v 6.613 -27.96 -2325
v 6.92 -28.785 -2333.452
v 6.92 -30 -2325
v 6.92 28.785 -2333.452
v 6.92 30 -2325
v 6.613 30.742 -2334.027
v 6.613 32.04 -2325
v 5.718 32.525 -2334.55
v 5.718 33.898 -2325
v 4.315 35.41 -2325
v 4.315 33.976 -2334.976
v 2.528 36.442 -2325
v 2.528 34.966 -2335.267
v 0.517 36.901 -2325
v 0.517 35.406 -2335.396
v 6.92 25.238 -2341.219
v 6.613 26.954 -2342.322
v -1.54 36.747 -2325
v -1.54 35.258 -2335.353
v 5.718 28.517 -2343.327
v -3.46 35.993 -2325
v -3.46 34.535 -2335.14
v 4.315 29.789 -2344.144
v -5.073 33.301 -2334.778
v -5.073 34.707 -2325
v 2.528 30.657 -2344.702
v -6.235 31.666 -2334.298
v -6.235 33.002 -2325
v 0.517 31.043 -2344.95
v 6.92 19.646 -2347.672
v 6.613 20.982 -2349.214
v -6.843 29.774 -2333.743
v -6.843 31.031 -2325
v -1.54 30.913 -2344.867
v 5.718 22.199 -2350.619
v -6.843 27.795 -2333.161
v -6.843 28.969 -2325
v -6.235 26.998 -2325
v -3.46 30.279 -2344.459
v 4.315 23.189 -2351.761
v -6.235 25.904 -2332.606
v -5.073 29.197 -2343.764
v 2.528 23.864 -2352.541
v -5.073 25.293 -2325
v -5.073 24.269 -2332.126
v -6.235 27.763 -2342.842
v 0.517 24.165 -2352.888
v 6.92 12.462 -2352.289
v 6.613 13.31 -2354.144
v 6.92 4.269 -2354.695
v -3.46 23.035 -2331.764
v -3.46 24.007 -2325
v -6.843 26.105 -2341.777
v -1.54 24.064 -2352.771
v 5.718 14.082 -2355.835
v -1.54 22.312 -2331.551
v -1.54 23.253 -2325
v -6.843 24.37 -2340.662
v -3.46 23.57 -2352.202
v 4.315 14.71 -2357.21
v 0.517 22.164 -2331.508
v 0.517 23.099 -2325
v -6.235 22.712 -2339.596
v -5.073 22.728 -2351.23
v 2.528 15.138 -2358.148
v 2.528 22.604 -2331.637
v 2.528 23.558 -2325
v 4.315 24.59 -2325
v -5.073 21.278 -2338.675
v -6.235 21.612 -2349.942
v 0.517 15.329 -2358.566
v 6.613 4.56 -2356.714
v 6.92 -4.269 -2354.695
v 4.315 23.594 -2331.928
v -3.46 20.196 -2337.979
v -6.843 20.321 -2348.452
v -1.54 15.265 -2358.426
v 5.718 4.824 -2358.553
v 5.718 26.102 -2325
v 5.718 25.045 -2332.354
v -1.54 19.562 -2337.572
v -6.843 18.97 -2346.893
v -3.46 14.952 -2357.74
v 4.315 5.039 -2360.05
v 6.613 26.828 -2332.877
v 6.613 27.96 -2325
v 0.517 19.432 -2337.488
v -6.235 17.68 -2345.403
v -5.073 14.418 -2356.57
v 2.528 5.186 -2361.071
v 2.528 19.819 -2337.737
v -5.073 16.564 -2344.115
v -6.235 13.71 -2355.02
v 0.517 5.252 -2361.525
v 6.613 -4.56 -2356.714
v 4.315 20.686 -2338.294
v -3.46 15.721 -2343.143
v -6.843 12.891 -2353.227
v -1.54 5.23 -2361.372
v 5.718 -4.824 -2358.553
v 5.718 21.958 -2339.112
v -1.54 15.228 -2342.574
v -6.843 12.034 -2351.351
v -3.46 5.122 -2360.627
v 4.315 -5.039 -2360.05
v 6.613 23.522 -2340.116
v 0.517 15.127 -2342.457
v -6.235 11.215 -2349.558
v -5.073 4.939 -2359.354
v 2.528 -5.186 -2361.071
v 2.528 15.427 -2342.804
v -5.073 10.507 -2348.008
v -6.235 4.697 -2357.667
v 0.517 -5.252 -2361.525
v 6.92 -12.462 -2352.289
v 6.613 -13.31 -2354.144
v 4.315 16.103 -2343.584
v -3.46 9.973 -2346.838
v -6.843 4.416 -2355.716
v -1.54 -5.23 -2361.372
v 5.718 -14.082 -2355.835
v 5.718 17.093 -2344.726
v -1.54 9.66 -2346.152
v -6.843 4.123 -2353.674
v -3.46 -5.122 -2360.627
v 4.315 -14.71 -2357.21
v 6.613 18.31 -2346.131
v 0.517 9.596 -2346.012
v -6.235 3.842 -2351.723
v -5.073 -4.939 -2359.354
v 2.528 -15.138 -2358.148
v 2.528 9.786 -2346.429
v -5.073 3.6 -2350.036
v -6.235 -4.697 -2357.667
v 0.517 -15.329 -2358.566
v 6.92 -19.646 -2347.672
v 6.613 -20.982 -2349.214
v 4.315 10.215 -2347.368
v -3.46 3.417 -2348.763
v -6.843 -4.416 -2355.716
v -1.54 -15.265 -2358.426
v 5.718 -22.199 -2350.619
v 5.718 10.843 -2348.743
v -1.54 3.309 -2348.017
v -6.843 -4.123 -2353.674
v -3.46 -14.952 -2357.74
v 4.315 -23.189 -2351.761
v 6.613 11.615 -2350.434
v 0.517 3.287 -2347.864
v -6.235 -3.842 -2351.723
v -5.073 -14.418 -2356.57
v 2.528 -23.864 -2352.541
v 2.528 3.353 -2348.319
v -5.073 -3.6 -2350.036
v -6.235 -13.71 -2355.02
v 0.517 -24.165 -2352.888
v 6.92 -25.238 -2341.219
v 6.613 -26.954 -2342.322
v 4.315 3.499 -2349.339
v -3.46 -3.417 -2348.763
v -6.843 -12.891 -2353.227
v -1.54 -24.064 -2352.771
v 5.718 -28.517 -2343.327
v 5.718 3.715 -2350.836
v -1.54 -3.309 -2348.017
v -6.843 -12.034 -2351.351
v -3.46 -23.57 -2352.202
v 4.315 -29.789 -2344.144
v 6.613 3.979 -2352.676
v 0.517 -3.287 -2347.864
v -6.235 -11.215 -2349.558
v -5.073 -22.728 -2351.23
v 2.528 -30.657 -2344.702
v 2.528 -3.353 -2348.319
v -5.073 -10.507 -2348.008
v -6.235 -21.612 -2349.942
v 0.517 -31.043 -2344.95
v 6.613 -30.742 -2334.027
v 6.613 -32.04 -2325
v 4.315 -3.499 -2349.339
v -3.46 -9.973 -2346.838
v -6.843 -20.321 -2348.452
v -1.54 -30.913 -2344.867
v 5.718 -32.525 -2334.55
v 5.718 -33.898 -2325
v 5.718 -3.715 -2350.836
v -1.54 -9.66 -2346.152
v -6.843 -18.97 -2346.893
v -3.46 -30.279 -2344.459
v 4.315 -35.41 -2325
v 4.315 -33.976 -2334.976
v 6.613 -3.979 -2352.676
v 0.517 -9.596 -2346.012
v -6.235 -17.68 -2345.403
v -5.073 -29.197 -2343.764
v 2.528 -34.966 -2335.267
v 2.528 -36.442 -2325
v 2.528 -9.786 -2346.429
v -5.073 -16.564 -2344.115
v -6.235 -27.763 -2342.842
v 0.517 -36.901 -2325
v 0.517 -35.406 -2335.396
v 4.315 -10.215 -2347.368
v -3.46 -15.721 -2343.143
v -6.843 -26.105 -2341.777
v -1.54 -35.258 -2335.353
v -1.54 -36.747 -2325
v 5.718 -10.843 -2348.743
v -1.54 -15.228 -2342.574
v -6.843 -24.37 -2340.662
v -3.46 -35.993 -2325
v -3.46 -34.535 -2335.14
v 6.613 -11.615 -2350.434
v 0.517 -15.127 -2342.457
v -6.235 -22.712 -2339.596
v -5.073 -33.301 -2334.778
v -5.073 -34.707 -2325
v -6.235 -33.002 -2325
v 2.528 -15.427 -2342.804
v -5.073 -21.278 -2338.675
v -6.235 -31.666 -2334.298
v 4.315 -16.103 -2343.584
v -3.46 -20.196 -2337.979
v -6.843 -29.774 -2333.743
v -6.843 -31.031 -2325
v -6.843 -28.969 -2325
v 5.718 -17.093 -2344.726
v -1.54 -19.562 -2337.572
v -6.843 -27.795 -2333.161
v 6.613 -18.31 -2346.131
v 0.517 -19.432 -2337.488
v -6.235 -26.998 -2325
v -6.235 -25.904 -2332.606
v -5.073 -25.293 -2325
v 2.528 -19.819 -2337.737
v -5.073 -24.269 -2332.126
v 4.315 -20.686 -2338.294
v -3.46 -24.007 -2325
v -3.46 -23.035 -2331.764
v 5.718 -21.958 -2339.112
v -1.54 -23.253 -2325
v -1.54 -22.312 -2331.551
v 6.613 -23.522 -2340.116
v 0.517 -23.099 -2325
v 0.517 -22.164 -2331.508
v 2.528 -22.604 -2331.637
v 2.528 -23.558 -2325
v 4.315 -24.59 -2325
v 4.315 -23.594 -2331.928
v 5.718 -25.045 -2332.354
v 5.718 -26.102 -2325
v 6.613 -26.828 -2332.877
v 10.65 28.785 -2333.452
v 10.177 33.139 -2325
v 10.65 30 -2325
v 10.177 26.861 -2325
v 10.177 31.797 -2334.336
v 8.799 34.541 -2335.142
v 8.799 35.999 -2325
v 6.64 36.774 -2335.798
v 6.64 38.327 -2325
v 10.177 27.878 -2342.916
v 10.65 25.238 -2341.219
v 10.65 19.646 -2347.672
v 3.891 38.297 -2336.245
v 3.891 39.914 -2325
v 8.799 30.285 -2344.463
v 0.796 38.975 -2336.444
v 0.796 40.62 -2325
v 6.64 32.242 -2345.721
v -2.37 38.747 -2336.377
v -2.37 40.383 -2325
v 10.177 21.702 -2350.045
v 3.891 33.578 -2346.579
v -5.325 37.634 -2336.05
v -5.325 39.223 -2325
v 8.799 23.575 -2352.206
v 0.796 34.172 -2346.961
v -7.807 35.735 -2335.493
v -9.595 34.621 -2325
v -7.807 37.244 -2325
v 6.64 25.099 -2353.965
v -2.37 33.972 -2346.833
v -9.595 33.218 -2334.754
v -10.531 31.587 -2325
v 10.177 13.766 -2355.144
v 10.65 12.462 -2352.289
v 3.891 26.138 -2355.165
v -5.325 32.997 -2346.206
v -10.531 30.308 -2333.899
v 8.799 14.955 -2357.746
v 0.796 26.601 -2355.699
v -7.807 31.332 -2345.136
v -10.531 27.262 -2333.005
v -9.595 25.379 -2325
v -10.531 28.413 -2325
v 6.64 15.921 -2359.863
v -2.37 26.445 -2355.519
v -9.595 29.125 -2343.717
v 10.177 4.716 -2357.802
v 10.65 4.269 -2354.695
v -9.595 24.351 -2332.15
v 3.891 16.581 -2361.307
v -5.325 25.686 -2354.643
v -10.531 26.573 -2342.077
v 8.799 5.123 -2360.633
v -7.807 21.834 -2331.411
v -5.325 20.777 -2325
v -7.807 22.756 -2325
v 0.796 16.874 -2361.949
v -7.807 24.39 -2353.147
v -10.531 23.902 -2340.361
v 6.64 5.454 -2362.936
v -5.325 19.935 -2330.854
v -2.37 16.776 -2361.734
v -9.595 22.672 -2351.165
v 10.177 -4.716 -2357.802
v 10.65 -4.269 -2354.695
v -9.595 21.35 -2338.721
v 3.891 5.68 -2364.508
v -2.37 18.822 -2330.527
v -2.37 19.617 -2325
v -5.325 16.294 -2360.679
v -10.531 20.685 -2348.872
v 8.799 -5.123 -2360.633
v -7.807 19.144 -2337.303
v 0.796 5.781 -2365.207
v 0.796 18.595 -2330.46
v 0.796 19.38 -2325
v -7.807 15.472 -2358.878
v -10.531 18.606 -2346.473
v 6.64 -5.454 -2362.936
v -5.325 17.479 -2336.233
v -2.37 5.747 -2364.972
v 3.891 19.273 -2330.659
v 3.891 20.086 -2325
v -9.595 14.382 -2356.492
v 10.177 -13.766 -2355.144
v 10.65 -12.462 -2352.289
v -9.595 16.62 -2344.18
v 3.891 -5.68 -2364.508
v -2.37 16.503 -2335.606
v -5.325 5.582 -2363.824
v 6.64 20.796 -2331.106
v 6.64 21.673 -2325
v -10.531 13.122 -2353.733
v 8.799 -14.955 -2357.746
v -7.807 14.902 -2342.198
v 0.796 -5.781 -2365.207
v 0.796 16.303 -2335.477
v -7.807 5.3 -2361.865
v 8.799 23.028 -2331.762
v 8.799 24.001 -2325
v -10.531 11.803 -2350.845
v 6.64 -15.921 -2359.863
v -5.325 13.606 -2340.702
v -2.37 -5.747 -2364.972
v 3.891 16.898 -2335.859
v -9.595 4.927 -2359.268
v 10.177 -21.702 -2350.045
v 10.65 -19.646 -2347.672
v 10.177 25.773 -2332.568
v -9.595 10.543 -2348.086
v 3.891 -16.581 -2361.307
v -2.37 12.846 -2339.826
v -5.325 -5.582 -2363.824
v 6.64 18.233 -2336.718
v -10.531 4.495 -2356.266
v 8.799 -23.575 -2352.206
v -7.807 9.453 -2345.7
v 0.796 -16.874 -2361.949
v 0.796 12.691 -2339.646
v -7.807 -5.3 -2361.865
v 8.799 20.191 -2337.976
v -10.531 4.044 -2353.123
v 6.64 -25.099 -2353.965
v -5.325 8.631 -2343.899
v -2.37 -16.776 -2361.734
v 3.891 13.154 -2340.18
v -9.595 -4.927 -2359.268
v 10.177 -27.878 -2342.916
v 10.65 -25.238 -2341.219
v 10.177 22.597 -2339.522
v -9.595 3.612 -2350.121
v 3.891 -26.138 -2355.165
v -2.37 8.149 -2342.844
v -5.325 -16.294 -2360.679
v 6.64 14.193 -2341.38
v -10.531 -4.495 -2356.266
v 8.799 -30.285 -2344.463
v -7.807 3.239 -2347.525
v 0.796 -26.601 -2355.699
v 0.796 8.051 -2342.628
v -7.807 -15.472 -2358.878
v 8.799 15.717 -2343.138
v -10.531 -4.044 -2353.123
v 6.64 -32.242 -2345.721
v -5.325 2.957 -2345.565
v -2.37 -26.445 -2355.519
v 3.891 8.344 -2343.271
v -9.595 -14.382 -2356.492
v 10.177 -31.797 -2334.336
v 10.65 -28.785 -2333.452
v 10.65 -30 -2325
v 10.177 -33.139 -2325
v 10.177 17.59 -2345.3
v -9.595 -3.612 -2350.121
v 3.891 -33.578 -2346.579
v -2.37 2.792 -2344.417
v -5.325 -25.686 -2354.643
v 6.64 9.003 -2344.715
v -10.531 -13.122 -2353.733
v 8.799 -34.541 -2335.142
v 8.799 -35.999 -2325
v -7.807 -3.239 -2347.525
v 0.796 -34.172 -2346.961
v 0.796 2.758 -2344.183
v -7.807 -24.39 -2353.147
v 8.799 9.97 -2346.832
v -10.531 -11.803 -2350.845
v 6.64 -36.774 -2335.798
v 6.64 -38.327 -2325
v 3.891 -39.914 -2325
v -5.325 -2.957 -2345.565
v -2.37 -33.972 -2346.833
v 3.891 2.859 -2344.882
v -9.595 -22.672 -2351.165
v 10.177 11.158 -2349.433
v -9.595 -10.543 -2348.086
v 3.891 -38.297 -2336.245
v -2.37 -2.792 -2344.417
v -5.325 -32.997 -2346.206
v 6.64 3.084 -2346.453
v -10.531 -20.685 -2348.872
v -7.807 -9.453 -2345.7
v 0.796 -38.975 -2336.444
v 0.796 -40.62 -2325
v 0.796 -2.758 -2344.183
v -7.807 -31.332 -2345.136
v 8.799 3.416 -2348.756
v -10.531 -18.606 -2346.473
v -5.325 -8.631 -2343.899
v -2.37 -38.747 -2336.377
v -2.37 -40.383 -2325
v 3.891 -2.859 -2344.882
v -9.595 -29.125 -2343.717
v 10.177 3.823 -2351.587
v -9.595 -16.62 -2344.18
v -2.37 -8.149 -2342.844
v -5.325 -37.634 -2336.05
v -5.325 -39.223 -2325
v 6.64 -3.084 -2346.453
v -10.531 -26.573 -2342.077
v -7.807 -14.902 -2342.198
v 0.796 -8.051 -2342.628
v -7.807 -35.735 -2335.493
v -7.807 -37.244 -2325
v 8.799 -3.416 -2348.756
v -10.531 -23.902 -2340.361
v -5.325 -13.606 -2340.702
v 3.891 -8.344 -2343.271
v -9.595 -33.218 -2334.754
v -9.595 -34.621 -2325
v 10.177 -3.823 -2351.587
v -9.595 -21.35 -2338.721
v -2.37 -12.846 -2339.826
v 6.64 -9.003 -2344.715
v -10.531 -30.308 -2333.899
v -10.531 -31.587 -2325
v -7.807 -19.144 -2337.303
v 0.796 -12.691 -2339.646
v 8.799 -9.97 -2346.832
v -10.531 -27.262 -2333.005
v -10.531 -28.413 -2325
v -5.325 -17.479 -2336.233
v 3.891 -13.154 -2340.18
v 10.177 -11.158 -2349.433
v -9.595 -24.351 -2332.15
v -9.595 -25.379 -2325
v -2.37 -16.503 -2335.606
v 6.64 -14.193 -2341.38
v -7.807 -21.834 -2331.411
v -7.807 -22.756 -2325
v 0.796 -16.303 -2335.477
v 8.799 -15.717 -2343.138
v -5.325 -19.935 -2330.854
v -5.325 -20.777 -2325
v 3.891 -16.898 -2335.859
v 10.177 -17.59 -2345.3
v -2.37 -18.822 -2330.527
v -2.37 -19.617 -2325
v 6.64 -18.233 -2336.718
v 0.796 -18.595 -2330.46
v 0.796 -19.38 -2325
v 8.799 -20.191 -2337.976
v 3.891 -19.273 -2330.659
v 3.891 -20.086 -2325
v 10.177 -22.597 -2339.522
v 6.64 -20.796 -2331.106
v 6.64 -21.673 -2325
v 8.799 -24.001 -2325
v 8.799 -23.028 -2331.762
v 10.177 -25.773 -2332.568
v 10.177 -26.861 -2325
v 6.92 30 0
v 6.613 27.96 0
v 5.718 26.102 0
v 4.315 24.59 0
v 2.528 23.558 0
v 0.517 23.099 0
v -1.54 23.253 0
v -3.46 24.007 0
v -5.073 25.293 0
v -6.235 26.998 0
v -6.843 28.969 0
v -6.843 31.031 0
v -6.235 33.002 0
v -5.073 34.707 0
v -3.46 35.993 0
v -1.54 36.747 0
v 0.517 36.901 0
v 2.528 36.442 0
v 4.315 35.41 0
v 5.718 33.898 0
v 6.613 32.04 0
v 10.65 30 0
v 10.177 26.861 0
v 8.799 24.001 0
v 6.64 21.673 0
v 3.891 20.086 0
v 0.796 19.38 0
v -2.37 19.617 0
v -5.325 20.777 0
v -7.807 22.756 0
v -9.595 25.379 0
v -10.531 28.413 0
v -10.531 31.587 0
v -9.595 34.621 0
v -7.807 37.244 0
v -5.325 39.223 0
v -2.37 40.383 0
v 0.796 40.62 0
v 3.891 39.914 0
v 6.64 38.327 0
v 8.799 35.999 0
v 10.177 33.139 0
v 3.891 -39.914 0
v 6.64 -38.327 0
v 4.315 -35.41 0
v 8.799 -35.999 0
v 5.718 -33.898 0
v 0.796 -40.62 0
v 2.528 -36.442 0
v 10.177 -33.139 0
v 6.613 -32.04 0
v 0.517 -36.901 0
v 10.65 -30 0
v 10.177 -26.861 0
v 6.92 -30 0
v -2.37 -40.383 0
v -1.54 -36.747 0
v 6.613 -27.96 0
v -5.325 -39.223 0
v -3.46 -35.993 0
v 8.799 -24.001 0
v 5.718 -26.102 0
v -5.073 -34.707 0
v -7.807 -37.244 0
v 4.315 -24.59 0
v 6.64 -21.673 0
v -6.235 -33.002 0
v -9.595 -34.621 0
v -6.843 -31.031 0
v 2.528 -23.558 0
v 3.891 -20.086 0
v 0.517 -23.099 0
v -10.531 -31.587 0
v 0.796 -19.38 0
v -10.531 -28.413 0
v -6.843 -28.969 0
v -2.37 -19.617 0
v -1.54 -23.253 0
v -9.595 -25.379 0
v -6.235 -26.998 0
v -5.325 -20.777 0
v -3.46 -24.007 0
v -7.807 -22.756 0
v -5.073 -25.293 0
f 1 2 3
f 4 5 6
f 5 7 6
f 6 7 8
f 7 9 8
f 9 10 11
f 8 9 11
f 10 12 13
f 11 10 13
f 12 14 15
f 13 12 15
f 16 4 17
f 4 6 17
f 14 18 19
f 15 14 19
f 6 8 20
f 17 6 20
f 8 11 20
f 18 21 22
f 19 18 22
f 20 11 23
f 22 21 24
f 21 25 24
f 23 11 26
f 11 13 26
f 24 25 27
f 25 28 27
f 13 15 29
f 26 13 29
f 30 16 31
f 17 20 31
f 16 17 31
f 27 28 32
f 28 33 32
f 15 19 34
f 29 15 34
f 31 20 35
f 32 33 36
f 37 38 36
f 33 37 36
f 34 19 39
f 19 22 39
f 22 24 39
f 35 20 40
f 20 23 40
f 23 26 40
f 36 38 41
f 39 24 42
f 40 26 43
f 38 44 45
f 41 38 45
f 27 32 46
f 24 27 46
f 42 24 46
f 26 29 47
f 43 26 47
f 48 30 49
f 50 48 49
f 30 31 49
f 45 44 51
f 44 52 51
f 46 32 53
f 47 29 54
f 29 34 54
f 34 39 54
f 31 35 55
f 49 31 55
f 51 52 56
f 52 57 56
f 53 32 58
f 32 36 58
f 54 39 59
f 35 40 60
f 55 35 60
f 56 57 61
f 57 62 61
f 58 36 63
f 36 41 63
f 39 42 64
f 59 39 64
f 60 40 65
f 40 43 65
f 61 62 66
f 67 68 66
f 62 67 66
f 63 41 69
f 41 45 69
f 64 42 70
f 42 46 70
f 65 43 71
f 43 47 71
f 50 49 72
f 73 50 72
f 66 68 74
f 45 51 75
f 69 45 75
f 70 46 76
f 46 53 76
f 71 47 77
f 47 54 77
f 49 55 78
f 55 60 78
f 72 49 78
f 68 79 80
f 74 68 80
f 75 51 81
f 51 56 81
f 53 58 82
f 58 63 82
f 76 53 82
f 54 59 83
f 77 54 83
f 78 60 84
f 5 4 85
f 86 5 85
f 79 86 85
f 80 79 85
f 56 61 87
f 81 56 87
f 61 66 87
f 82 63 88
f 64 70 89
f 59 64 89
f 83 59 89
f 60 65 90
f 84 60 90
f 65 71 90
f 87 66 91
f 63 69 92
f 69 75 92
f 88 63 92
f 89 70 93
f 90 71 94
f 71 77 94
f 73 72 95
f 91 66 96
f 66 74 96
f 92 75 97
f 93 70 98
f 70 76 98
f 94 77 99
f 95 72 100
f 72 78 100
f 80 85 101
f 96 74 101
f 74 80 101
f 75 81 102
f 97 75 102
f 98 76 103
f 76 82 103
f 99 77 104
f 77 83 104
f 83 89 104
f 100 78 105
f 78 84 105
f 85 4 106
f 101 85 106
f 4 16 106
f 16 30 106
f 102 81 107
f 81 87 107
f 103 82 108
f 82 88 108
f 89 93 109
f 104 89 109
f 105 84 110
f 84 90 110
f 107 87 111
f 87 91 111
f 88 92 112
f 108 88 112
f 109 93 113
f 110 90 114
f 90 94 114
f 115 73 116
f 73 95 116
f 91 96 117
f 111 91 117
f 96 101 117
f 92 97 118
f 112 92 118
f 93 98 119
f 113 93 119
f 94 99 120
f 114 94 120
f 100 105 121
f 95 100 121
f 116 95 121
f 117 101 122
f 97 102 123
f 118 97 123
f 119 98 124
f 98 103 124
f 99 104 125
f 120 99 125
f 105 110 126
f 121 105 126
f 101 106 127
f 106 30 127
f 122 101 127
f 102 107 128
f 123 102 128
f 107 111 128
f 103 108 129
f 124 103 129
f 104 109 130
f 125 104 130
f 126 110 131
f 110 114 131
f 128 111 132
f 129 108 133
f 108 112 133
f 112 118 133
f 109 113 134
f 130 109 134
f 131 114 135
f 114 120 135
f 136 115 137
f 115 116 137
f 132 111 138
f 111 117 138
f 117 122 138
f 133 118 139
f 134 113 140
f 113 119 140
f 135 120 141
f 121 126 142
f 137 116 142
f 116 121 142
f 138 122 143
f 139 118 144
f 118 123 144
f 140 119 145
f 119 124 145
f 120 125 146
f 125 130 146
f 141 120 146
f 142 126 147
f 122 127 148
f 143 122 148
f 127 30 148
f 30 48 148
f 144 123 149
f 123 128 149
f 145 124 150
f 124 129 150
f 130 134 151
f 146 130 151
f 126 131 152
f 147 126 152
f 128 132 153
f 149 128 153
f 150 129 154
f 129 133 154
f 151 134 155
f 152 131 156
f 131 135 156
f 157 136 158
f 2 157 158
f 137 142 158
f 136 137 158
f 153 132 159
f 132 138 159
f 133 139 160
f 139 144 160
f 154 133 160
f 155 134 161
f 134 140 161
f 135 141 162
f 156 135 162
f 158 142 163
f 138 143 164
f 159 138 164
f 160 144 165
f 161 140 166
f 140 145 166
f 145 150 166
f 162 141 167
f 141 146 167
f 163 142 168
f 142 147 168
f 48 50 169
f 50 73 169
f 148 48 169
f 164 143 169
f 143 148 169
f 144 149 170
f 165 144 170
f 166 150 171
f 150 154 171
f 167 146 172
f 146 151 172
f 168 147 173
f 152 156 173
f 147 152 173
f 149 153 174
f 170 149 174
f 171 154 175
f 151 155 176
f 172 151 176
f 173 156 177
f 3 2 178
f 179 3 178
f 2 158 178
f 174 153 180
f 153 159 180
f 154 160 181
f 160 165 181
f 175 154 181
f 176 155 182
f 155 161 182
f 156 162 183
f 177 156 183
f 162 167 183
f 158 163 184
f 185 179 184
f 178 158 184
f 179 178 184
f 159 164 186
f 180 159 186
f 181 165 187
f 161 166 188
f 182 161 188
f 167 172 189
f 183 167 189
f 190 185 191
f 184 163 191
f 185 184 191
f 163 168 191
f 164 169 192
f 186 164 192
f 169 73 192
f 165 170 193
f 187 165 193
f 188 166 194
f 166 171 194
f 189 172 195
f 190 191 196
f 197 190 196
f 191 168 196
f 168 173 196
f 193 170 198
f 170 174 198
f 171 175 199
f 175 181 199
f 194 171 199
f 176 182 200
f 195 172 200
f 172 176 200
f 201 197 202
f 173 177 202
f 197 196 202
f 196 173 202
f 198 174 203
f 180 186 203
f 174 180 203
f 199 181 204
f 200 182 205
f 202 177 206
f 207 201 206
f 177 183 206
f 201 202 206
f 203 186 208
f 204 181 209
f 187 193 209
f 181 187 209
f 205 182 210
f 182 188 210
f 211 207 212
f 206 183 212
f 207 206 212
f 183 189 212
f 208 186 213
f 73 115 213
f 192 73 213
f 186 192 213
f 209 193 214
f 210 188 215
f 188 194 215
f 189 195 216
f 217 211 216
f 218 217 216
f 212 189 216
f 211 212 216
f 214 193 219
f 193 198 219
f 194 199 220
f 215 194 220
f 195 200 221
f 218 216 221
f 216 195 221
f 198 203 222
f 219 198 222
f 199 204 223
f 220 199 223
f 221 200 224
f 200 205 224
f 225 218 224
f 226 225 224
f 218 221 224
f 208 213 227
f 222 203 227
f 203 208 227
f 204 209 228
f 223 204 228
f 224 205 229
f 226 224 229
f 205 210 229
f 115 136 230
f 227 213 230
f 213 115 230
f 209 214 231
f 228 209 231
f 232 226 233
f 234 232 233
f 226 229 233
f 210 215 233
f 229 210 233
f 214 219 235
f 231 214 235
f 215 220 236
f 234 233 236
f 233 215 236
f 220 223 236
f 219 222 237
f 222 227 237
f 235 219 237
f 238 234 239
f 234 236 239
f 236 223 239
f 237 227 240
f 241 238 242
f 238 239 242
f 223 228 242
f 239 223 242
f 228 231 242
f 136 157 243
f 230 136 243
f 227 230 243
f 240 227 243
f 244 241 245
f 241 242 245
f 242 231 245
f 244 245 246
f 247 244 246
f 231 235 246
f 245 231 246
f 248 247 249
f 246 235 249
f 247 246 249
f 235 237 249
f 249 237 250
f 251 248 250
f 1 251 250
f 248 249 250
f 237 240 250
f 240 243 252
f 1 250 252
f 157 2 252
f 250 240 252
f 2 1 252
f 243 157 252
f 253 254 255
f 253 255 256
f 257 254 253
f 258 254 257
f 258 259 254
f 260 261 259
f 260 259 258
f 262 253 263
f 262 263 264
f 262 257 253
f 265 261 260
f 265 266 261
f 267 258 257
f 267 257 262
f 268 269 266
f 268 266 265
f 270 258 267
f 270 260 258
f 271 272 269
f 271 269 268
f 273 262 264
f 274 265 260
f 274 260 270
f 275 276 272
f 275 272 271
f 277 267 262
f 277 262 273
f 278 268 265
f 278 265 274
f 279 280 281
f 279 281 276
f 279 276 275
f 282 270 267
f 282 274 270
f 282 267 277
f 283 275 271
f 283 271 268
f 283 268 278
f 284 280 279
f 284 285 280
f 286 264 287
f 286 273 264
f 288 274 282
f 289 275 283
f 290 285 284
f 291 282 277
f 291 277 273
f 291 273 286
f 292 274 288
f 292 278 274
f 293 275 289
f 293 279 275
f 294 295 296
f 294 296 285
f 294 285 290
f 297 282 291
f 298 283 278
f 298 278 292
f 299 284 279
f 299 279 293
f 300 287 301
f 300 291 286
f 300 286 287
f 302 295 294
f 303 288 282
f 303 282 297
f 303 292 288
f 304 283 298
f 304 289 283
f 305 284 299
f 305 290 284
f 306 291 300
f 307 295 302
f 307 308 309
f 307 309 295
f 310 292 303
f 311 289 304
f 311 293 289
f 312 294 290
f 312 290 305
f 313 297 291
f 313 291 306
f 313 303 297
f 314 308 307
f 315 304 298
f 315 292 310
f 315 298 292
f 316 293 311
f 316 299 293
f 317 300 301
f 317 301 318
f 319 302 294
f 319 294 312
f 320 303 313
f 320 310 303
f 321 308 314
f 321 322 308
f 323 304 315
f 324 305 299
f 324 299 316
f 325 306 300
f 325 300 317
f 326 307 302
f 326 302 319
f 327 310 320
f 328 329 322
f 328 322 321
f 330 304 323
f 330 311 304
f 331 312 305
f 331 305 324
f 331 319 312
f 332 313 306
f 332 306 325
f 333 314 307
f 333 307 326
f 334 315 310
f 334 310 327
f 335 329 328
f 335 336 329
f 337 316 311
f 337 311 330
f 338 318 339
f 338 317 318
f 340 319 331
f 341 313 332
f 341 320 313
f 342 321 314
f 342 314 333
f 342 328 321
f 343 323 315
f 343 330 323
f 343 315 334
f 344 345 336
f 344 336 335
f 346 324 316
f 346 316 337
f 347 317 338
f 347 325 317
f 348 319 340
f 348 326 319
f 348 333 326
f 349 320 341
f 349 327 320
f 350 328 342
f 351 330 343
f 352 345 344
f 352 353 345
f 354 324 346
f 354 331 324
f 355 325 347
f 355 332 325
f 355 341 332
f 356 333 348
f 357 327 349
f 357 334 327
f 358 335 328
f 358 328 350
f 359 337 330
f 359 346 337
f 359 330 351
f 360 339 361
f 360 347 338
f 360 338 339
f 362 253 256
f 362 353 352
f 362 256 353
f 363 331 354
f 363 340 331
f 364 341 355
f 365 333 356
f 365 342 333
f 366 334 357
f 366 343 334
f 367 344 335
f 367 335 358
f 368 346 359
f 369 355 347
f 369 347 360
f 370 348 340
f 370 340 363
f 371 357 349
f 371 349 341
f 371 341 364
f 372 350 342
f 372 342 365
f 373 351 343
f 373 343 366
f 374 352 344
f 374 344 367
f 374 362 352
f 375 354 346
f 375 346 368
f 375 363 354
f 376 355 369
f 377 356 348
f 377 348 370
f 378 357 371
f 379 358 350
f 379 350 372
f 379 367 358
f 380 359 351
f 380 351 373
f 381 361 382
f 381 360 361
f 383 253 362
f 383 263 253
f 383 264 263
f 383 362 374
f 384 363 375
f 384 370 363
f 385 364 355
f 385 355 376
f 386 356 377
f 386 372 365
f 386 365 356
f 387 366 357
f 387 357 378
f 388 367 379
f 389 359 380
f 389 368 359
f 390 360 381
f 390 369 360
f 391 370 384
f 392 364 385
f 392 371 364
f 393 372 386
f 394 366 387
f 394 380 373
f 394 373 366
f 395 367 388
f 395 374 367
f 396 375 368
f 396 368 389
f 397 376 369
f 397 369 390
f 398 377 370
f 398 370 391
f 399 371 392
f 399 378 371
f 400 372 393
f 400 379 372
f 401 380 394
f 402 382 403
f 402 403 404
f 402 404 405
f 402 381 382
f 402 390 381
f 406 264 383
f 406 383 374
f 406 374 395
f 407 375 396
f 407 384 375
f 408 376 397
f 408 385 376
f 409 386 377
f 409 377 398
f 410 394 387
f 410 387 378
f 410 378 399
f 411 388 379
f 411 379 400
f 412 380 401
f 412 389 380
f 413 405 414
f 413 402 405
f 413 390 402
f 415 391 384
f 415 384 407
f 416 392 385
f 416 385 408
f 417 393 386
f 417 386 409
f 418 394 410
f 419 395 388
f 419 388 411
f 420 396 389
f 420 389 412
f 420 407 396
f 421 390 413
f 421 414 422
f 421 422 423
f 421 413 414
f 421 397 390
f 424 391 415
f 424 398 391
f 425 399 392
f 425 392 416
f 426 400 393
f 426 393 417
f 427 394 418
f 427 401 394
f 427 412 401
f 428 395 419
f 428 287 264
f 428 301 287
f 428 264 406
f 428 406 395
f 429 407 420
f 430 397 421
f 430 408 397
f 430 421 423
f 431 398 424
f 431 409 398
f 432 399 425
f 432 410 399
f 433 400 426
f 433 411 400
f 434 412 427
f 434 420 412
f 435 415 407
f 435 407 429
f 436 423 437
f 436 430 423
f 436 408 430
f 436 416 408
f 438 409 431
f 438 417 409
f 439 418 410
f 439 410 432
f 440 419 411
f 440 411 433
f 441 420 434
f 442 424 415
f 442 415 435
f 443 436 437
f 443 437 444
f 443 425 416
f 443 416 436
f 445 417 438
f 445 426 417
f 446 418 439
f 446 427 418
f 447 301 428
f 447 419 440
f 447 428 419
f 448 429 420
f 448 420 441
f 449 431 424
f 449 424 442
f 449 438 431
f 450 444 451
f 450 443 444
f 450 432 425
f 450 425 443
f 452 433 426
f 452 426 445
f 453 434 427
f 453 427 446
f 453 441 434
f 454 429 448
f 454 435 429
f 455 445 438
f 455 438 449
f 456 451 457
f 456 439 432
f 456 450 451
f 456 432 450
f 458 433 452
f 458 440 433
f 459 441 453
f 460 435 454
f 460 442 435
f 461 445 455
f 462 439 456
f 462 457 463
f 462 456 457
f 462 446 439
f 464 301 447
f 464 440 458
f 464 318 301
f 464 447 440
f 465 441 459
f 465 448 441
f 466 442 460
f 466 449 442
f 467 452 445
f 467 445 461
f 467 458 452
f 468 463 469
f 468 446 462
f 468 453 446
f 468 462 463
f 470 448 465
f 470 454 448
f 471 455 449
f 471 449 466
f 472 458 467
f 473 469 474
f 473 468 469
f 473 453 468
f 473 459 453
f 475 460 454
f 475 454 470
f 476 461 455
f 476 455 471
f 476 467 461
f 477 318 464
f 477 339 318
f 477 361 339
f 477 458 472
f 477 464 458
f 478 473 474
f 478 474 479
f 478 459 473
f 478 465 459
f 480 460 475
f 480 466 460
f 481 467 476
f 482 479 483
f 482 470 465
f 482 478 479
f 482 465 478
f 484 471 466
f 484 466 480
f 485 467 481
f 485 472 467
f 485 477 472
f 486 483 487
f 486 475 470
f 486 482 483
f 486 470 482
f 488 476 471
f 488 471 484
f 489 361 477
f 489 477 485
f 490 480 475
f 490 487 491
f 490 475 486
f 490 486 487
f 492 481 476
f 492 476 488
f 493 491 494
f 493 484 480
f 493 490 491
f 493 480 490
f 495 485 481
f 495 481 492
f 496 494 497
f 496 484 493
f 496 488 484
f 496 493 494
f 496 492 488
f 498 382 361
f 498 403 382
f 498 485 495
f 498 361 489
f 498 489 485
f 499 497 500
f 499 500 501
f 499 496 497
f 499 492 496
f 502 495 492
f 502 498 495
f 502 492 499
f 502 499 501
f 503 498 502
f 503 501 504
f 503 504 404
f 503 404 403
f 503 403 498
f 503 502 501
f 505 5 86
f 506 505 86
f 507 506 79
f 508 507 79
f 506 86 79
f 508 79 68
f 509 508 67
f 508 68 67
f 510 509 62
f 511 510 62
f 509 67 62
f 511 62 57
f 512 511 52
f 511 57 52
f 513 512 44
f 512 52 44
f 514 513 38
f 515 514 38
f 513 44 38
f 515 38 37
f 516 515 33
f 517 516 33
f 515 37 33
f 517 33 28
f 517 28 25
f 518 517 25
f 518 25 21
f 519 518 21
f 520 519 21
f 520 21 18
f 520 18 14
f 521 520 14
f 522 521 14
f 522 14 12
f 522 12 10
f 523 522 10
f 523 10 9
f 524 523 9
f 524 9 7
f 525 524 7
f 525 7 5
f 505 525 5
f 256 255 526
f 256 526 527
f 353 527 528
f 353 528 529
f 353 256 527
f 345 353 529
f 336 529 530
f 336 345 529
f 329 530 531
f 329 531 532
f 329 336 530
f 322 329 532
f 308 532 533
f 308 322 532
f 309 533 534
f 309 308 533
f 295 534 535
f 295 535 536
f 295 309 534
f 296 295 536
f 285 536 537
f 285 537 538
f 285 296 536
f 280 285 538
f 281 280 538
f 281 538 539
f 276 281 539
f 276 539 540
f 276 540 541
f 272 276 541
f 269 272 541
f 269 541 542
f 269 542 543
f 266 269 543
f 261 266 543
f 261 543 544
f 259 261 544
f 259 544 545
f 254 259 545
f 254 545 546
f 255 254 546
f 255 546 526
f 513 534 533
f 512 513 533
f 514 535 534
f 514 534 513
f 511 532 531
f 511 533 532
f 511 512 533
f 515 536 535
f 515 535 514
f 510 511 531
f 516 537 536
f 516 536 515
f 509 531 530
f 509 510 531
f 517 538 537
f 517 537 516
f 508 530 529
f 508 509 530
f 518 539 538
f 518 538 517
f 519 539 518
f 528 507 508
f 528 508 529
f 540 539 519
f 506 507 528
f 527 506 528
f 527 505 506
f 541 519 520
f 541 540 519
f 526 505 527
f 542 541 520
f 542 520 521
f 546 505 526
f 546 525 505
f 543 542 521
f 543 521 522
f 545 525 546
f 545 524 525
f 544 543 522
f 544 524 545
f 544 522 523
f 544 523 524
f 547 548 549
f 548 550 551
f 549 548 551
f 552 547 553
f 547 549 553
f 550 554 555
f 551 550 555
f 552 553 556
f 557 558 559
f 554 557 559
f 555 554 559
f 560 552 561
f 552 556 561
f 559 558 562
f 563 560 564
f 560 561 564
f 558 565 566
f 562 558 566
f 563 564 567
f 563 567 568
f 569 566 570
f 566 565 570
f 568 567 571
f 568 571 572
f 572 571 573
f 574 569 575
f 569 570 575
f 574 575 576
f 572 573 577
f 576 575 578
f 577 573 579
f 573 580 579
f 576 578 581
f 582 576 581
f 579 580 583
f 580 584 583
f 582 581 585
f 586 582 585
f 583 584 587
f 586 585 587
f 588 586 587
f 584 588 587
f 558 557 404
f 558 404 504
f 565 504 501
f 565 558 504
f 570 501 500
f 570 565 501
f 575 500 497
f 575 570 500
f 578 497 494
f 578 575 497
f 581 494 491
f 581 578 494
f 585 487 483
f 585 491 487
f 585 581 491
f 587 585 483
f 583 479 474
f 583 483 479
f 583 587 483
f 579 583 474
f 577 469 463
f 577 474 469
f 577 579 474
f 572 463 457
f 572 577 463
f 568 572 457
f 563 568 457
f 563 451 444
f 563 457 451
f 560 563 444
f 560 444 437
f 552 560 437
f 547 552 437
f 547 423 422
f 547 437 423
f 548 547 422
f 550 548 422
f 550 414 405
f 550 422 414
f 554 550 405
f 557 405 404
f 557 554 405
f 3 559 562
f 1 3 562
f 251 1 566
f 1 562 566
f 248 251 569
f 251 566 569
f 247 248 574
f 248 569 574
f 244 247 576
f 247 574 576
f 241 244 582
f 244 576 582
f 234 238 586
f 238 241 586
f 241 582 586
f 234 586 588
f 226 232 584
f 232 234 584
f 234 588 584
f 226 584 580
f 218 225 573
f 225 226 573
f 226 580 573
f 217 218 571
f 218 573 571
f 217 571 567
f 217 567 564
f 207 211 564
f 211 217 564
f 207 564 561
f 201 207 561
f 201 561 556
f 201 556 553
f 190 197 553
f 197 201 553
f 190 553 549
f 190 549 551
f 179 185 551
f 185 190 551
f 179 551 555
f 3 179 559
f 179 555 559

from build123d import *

# Parameters (mm, degrees)
SKETCH2_R   = 10.65
SKETCH2_R_2 = 6.92


with BuildPart() as part:
    # Sweep1: sweep along a path in Sketch1
    with BuildLine(Plane(origin=(0, 0, 0), x_dir=(0, 0, -1), z_dir=(1, 0, 0))) as sweep1_path:
        Line((0, 30), (2325, 30))
        ThreePointArc((2325, 30), (2355, 0), (2325, -30))
        Line((2325, -30), (0, -30))
    # Sketch2 → Sweep1 (sweep)
    with BuildSketch(Plane.XY):
        with Locations((0, 30)):
            Circle(SKETCH2_R)
        with Locations((0, 30)):
            Circle(SKETCH2_R_2, mode=Mode.SUBTRACT)
    sweep(path=sweep1_path.line)


solid = part.part
